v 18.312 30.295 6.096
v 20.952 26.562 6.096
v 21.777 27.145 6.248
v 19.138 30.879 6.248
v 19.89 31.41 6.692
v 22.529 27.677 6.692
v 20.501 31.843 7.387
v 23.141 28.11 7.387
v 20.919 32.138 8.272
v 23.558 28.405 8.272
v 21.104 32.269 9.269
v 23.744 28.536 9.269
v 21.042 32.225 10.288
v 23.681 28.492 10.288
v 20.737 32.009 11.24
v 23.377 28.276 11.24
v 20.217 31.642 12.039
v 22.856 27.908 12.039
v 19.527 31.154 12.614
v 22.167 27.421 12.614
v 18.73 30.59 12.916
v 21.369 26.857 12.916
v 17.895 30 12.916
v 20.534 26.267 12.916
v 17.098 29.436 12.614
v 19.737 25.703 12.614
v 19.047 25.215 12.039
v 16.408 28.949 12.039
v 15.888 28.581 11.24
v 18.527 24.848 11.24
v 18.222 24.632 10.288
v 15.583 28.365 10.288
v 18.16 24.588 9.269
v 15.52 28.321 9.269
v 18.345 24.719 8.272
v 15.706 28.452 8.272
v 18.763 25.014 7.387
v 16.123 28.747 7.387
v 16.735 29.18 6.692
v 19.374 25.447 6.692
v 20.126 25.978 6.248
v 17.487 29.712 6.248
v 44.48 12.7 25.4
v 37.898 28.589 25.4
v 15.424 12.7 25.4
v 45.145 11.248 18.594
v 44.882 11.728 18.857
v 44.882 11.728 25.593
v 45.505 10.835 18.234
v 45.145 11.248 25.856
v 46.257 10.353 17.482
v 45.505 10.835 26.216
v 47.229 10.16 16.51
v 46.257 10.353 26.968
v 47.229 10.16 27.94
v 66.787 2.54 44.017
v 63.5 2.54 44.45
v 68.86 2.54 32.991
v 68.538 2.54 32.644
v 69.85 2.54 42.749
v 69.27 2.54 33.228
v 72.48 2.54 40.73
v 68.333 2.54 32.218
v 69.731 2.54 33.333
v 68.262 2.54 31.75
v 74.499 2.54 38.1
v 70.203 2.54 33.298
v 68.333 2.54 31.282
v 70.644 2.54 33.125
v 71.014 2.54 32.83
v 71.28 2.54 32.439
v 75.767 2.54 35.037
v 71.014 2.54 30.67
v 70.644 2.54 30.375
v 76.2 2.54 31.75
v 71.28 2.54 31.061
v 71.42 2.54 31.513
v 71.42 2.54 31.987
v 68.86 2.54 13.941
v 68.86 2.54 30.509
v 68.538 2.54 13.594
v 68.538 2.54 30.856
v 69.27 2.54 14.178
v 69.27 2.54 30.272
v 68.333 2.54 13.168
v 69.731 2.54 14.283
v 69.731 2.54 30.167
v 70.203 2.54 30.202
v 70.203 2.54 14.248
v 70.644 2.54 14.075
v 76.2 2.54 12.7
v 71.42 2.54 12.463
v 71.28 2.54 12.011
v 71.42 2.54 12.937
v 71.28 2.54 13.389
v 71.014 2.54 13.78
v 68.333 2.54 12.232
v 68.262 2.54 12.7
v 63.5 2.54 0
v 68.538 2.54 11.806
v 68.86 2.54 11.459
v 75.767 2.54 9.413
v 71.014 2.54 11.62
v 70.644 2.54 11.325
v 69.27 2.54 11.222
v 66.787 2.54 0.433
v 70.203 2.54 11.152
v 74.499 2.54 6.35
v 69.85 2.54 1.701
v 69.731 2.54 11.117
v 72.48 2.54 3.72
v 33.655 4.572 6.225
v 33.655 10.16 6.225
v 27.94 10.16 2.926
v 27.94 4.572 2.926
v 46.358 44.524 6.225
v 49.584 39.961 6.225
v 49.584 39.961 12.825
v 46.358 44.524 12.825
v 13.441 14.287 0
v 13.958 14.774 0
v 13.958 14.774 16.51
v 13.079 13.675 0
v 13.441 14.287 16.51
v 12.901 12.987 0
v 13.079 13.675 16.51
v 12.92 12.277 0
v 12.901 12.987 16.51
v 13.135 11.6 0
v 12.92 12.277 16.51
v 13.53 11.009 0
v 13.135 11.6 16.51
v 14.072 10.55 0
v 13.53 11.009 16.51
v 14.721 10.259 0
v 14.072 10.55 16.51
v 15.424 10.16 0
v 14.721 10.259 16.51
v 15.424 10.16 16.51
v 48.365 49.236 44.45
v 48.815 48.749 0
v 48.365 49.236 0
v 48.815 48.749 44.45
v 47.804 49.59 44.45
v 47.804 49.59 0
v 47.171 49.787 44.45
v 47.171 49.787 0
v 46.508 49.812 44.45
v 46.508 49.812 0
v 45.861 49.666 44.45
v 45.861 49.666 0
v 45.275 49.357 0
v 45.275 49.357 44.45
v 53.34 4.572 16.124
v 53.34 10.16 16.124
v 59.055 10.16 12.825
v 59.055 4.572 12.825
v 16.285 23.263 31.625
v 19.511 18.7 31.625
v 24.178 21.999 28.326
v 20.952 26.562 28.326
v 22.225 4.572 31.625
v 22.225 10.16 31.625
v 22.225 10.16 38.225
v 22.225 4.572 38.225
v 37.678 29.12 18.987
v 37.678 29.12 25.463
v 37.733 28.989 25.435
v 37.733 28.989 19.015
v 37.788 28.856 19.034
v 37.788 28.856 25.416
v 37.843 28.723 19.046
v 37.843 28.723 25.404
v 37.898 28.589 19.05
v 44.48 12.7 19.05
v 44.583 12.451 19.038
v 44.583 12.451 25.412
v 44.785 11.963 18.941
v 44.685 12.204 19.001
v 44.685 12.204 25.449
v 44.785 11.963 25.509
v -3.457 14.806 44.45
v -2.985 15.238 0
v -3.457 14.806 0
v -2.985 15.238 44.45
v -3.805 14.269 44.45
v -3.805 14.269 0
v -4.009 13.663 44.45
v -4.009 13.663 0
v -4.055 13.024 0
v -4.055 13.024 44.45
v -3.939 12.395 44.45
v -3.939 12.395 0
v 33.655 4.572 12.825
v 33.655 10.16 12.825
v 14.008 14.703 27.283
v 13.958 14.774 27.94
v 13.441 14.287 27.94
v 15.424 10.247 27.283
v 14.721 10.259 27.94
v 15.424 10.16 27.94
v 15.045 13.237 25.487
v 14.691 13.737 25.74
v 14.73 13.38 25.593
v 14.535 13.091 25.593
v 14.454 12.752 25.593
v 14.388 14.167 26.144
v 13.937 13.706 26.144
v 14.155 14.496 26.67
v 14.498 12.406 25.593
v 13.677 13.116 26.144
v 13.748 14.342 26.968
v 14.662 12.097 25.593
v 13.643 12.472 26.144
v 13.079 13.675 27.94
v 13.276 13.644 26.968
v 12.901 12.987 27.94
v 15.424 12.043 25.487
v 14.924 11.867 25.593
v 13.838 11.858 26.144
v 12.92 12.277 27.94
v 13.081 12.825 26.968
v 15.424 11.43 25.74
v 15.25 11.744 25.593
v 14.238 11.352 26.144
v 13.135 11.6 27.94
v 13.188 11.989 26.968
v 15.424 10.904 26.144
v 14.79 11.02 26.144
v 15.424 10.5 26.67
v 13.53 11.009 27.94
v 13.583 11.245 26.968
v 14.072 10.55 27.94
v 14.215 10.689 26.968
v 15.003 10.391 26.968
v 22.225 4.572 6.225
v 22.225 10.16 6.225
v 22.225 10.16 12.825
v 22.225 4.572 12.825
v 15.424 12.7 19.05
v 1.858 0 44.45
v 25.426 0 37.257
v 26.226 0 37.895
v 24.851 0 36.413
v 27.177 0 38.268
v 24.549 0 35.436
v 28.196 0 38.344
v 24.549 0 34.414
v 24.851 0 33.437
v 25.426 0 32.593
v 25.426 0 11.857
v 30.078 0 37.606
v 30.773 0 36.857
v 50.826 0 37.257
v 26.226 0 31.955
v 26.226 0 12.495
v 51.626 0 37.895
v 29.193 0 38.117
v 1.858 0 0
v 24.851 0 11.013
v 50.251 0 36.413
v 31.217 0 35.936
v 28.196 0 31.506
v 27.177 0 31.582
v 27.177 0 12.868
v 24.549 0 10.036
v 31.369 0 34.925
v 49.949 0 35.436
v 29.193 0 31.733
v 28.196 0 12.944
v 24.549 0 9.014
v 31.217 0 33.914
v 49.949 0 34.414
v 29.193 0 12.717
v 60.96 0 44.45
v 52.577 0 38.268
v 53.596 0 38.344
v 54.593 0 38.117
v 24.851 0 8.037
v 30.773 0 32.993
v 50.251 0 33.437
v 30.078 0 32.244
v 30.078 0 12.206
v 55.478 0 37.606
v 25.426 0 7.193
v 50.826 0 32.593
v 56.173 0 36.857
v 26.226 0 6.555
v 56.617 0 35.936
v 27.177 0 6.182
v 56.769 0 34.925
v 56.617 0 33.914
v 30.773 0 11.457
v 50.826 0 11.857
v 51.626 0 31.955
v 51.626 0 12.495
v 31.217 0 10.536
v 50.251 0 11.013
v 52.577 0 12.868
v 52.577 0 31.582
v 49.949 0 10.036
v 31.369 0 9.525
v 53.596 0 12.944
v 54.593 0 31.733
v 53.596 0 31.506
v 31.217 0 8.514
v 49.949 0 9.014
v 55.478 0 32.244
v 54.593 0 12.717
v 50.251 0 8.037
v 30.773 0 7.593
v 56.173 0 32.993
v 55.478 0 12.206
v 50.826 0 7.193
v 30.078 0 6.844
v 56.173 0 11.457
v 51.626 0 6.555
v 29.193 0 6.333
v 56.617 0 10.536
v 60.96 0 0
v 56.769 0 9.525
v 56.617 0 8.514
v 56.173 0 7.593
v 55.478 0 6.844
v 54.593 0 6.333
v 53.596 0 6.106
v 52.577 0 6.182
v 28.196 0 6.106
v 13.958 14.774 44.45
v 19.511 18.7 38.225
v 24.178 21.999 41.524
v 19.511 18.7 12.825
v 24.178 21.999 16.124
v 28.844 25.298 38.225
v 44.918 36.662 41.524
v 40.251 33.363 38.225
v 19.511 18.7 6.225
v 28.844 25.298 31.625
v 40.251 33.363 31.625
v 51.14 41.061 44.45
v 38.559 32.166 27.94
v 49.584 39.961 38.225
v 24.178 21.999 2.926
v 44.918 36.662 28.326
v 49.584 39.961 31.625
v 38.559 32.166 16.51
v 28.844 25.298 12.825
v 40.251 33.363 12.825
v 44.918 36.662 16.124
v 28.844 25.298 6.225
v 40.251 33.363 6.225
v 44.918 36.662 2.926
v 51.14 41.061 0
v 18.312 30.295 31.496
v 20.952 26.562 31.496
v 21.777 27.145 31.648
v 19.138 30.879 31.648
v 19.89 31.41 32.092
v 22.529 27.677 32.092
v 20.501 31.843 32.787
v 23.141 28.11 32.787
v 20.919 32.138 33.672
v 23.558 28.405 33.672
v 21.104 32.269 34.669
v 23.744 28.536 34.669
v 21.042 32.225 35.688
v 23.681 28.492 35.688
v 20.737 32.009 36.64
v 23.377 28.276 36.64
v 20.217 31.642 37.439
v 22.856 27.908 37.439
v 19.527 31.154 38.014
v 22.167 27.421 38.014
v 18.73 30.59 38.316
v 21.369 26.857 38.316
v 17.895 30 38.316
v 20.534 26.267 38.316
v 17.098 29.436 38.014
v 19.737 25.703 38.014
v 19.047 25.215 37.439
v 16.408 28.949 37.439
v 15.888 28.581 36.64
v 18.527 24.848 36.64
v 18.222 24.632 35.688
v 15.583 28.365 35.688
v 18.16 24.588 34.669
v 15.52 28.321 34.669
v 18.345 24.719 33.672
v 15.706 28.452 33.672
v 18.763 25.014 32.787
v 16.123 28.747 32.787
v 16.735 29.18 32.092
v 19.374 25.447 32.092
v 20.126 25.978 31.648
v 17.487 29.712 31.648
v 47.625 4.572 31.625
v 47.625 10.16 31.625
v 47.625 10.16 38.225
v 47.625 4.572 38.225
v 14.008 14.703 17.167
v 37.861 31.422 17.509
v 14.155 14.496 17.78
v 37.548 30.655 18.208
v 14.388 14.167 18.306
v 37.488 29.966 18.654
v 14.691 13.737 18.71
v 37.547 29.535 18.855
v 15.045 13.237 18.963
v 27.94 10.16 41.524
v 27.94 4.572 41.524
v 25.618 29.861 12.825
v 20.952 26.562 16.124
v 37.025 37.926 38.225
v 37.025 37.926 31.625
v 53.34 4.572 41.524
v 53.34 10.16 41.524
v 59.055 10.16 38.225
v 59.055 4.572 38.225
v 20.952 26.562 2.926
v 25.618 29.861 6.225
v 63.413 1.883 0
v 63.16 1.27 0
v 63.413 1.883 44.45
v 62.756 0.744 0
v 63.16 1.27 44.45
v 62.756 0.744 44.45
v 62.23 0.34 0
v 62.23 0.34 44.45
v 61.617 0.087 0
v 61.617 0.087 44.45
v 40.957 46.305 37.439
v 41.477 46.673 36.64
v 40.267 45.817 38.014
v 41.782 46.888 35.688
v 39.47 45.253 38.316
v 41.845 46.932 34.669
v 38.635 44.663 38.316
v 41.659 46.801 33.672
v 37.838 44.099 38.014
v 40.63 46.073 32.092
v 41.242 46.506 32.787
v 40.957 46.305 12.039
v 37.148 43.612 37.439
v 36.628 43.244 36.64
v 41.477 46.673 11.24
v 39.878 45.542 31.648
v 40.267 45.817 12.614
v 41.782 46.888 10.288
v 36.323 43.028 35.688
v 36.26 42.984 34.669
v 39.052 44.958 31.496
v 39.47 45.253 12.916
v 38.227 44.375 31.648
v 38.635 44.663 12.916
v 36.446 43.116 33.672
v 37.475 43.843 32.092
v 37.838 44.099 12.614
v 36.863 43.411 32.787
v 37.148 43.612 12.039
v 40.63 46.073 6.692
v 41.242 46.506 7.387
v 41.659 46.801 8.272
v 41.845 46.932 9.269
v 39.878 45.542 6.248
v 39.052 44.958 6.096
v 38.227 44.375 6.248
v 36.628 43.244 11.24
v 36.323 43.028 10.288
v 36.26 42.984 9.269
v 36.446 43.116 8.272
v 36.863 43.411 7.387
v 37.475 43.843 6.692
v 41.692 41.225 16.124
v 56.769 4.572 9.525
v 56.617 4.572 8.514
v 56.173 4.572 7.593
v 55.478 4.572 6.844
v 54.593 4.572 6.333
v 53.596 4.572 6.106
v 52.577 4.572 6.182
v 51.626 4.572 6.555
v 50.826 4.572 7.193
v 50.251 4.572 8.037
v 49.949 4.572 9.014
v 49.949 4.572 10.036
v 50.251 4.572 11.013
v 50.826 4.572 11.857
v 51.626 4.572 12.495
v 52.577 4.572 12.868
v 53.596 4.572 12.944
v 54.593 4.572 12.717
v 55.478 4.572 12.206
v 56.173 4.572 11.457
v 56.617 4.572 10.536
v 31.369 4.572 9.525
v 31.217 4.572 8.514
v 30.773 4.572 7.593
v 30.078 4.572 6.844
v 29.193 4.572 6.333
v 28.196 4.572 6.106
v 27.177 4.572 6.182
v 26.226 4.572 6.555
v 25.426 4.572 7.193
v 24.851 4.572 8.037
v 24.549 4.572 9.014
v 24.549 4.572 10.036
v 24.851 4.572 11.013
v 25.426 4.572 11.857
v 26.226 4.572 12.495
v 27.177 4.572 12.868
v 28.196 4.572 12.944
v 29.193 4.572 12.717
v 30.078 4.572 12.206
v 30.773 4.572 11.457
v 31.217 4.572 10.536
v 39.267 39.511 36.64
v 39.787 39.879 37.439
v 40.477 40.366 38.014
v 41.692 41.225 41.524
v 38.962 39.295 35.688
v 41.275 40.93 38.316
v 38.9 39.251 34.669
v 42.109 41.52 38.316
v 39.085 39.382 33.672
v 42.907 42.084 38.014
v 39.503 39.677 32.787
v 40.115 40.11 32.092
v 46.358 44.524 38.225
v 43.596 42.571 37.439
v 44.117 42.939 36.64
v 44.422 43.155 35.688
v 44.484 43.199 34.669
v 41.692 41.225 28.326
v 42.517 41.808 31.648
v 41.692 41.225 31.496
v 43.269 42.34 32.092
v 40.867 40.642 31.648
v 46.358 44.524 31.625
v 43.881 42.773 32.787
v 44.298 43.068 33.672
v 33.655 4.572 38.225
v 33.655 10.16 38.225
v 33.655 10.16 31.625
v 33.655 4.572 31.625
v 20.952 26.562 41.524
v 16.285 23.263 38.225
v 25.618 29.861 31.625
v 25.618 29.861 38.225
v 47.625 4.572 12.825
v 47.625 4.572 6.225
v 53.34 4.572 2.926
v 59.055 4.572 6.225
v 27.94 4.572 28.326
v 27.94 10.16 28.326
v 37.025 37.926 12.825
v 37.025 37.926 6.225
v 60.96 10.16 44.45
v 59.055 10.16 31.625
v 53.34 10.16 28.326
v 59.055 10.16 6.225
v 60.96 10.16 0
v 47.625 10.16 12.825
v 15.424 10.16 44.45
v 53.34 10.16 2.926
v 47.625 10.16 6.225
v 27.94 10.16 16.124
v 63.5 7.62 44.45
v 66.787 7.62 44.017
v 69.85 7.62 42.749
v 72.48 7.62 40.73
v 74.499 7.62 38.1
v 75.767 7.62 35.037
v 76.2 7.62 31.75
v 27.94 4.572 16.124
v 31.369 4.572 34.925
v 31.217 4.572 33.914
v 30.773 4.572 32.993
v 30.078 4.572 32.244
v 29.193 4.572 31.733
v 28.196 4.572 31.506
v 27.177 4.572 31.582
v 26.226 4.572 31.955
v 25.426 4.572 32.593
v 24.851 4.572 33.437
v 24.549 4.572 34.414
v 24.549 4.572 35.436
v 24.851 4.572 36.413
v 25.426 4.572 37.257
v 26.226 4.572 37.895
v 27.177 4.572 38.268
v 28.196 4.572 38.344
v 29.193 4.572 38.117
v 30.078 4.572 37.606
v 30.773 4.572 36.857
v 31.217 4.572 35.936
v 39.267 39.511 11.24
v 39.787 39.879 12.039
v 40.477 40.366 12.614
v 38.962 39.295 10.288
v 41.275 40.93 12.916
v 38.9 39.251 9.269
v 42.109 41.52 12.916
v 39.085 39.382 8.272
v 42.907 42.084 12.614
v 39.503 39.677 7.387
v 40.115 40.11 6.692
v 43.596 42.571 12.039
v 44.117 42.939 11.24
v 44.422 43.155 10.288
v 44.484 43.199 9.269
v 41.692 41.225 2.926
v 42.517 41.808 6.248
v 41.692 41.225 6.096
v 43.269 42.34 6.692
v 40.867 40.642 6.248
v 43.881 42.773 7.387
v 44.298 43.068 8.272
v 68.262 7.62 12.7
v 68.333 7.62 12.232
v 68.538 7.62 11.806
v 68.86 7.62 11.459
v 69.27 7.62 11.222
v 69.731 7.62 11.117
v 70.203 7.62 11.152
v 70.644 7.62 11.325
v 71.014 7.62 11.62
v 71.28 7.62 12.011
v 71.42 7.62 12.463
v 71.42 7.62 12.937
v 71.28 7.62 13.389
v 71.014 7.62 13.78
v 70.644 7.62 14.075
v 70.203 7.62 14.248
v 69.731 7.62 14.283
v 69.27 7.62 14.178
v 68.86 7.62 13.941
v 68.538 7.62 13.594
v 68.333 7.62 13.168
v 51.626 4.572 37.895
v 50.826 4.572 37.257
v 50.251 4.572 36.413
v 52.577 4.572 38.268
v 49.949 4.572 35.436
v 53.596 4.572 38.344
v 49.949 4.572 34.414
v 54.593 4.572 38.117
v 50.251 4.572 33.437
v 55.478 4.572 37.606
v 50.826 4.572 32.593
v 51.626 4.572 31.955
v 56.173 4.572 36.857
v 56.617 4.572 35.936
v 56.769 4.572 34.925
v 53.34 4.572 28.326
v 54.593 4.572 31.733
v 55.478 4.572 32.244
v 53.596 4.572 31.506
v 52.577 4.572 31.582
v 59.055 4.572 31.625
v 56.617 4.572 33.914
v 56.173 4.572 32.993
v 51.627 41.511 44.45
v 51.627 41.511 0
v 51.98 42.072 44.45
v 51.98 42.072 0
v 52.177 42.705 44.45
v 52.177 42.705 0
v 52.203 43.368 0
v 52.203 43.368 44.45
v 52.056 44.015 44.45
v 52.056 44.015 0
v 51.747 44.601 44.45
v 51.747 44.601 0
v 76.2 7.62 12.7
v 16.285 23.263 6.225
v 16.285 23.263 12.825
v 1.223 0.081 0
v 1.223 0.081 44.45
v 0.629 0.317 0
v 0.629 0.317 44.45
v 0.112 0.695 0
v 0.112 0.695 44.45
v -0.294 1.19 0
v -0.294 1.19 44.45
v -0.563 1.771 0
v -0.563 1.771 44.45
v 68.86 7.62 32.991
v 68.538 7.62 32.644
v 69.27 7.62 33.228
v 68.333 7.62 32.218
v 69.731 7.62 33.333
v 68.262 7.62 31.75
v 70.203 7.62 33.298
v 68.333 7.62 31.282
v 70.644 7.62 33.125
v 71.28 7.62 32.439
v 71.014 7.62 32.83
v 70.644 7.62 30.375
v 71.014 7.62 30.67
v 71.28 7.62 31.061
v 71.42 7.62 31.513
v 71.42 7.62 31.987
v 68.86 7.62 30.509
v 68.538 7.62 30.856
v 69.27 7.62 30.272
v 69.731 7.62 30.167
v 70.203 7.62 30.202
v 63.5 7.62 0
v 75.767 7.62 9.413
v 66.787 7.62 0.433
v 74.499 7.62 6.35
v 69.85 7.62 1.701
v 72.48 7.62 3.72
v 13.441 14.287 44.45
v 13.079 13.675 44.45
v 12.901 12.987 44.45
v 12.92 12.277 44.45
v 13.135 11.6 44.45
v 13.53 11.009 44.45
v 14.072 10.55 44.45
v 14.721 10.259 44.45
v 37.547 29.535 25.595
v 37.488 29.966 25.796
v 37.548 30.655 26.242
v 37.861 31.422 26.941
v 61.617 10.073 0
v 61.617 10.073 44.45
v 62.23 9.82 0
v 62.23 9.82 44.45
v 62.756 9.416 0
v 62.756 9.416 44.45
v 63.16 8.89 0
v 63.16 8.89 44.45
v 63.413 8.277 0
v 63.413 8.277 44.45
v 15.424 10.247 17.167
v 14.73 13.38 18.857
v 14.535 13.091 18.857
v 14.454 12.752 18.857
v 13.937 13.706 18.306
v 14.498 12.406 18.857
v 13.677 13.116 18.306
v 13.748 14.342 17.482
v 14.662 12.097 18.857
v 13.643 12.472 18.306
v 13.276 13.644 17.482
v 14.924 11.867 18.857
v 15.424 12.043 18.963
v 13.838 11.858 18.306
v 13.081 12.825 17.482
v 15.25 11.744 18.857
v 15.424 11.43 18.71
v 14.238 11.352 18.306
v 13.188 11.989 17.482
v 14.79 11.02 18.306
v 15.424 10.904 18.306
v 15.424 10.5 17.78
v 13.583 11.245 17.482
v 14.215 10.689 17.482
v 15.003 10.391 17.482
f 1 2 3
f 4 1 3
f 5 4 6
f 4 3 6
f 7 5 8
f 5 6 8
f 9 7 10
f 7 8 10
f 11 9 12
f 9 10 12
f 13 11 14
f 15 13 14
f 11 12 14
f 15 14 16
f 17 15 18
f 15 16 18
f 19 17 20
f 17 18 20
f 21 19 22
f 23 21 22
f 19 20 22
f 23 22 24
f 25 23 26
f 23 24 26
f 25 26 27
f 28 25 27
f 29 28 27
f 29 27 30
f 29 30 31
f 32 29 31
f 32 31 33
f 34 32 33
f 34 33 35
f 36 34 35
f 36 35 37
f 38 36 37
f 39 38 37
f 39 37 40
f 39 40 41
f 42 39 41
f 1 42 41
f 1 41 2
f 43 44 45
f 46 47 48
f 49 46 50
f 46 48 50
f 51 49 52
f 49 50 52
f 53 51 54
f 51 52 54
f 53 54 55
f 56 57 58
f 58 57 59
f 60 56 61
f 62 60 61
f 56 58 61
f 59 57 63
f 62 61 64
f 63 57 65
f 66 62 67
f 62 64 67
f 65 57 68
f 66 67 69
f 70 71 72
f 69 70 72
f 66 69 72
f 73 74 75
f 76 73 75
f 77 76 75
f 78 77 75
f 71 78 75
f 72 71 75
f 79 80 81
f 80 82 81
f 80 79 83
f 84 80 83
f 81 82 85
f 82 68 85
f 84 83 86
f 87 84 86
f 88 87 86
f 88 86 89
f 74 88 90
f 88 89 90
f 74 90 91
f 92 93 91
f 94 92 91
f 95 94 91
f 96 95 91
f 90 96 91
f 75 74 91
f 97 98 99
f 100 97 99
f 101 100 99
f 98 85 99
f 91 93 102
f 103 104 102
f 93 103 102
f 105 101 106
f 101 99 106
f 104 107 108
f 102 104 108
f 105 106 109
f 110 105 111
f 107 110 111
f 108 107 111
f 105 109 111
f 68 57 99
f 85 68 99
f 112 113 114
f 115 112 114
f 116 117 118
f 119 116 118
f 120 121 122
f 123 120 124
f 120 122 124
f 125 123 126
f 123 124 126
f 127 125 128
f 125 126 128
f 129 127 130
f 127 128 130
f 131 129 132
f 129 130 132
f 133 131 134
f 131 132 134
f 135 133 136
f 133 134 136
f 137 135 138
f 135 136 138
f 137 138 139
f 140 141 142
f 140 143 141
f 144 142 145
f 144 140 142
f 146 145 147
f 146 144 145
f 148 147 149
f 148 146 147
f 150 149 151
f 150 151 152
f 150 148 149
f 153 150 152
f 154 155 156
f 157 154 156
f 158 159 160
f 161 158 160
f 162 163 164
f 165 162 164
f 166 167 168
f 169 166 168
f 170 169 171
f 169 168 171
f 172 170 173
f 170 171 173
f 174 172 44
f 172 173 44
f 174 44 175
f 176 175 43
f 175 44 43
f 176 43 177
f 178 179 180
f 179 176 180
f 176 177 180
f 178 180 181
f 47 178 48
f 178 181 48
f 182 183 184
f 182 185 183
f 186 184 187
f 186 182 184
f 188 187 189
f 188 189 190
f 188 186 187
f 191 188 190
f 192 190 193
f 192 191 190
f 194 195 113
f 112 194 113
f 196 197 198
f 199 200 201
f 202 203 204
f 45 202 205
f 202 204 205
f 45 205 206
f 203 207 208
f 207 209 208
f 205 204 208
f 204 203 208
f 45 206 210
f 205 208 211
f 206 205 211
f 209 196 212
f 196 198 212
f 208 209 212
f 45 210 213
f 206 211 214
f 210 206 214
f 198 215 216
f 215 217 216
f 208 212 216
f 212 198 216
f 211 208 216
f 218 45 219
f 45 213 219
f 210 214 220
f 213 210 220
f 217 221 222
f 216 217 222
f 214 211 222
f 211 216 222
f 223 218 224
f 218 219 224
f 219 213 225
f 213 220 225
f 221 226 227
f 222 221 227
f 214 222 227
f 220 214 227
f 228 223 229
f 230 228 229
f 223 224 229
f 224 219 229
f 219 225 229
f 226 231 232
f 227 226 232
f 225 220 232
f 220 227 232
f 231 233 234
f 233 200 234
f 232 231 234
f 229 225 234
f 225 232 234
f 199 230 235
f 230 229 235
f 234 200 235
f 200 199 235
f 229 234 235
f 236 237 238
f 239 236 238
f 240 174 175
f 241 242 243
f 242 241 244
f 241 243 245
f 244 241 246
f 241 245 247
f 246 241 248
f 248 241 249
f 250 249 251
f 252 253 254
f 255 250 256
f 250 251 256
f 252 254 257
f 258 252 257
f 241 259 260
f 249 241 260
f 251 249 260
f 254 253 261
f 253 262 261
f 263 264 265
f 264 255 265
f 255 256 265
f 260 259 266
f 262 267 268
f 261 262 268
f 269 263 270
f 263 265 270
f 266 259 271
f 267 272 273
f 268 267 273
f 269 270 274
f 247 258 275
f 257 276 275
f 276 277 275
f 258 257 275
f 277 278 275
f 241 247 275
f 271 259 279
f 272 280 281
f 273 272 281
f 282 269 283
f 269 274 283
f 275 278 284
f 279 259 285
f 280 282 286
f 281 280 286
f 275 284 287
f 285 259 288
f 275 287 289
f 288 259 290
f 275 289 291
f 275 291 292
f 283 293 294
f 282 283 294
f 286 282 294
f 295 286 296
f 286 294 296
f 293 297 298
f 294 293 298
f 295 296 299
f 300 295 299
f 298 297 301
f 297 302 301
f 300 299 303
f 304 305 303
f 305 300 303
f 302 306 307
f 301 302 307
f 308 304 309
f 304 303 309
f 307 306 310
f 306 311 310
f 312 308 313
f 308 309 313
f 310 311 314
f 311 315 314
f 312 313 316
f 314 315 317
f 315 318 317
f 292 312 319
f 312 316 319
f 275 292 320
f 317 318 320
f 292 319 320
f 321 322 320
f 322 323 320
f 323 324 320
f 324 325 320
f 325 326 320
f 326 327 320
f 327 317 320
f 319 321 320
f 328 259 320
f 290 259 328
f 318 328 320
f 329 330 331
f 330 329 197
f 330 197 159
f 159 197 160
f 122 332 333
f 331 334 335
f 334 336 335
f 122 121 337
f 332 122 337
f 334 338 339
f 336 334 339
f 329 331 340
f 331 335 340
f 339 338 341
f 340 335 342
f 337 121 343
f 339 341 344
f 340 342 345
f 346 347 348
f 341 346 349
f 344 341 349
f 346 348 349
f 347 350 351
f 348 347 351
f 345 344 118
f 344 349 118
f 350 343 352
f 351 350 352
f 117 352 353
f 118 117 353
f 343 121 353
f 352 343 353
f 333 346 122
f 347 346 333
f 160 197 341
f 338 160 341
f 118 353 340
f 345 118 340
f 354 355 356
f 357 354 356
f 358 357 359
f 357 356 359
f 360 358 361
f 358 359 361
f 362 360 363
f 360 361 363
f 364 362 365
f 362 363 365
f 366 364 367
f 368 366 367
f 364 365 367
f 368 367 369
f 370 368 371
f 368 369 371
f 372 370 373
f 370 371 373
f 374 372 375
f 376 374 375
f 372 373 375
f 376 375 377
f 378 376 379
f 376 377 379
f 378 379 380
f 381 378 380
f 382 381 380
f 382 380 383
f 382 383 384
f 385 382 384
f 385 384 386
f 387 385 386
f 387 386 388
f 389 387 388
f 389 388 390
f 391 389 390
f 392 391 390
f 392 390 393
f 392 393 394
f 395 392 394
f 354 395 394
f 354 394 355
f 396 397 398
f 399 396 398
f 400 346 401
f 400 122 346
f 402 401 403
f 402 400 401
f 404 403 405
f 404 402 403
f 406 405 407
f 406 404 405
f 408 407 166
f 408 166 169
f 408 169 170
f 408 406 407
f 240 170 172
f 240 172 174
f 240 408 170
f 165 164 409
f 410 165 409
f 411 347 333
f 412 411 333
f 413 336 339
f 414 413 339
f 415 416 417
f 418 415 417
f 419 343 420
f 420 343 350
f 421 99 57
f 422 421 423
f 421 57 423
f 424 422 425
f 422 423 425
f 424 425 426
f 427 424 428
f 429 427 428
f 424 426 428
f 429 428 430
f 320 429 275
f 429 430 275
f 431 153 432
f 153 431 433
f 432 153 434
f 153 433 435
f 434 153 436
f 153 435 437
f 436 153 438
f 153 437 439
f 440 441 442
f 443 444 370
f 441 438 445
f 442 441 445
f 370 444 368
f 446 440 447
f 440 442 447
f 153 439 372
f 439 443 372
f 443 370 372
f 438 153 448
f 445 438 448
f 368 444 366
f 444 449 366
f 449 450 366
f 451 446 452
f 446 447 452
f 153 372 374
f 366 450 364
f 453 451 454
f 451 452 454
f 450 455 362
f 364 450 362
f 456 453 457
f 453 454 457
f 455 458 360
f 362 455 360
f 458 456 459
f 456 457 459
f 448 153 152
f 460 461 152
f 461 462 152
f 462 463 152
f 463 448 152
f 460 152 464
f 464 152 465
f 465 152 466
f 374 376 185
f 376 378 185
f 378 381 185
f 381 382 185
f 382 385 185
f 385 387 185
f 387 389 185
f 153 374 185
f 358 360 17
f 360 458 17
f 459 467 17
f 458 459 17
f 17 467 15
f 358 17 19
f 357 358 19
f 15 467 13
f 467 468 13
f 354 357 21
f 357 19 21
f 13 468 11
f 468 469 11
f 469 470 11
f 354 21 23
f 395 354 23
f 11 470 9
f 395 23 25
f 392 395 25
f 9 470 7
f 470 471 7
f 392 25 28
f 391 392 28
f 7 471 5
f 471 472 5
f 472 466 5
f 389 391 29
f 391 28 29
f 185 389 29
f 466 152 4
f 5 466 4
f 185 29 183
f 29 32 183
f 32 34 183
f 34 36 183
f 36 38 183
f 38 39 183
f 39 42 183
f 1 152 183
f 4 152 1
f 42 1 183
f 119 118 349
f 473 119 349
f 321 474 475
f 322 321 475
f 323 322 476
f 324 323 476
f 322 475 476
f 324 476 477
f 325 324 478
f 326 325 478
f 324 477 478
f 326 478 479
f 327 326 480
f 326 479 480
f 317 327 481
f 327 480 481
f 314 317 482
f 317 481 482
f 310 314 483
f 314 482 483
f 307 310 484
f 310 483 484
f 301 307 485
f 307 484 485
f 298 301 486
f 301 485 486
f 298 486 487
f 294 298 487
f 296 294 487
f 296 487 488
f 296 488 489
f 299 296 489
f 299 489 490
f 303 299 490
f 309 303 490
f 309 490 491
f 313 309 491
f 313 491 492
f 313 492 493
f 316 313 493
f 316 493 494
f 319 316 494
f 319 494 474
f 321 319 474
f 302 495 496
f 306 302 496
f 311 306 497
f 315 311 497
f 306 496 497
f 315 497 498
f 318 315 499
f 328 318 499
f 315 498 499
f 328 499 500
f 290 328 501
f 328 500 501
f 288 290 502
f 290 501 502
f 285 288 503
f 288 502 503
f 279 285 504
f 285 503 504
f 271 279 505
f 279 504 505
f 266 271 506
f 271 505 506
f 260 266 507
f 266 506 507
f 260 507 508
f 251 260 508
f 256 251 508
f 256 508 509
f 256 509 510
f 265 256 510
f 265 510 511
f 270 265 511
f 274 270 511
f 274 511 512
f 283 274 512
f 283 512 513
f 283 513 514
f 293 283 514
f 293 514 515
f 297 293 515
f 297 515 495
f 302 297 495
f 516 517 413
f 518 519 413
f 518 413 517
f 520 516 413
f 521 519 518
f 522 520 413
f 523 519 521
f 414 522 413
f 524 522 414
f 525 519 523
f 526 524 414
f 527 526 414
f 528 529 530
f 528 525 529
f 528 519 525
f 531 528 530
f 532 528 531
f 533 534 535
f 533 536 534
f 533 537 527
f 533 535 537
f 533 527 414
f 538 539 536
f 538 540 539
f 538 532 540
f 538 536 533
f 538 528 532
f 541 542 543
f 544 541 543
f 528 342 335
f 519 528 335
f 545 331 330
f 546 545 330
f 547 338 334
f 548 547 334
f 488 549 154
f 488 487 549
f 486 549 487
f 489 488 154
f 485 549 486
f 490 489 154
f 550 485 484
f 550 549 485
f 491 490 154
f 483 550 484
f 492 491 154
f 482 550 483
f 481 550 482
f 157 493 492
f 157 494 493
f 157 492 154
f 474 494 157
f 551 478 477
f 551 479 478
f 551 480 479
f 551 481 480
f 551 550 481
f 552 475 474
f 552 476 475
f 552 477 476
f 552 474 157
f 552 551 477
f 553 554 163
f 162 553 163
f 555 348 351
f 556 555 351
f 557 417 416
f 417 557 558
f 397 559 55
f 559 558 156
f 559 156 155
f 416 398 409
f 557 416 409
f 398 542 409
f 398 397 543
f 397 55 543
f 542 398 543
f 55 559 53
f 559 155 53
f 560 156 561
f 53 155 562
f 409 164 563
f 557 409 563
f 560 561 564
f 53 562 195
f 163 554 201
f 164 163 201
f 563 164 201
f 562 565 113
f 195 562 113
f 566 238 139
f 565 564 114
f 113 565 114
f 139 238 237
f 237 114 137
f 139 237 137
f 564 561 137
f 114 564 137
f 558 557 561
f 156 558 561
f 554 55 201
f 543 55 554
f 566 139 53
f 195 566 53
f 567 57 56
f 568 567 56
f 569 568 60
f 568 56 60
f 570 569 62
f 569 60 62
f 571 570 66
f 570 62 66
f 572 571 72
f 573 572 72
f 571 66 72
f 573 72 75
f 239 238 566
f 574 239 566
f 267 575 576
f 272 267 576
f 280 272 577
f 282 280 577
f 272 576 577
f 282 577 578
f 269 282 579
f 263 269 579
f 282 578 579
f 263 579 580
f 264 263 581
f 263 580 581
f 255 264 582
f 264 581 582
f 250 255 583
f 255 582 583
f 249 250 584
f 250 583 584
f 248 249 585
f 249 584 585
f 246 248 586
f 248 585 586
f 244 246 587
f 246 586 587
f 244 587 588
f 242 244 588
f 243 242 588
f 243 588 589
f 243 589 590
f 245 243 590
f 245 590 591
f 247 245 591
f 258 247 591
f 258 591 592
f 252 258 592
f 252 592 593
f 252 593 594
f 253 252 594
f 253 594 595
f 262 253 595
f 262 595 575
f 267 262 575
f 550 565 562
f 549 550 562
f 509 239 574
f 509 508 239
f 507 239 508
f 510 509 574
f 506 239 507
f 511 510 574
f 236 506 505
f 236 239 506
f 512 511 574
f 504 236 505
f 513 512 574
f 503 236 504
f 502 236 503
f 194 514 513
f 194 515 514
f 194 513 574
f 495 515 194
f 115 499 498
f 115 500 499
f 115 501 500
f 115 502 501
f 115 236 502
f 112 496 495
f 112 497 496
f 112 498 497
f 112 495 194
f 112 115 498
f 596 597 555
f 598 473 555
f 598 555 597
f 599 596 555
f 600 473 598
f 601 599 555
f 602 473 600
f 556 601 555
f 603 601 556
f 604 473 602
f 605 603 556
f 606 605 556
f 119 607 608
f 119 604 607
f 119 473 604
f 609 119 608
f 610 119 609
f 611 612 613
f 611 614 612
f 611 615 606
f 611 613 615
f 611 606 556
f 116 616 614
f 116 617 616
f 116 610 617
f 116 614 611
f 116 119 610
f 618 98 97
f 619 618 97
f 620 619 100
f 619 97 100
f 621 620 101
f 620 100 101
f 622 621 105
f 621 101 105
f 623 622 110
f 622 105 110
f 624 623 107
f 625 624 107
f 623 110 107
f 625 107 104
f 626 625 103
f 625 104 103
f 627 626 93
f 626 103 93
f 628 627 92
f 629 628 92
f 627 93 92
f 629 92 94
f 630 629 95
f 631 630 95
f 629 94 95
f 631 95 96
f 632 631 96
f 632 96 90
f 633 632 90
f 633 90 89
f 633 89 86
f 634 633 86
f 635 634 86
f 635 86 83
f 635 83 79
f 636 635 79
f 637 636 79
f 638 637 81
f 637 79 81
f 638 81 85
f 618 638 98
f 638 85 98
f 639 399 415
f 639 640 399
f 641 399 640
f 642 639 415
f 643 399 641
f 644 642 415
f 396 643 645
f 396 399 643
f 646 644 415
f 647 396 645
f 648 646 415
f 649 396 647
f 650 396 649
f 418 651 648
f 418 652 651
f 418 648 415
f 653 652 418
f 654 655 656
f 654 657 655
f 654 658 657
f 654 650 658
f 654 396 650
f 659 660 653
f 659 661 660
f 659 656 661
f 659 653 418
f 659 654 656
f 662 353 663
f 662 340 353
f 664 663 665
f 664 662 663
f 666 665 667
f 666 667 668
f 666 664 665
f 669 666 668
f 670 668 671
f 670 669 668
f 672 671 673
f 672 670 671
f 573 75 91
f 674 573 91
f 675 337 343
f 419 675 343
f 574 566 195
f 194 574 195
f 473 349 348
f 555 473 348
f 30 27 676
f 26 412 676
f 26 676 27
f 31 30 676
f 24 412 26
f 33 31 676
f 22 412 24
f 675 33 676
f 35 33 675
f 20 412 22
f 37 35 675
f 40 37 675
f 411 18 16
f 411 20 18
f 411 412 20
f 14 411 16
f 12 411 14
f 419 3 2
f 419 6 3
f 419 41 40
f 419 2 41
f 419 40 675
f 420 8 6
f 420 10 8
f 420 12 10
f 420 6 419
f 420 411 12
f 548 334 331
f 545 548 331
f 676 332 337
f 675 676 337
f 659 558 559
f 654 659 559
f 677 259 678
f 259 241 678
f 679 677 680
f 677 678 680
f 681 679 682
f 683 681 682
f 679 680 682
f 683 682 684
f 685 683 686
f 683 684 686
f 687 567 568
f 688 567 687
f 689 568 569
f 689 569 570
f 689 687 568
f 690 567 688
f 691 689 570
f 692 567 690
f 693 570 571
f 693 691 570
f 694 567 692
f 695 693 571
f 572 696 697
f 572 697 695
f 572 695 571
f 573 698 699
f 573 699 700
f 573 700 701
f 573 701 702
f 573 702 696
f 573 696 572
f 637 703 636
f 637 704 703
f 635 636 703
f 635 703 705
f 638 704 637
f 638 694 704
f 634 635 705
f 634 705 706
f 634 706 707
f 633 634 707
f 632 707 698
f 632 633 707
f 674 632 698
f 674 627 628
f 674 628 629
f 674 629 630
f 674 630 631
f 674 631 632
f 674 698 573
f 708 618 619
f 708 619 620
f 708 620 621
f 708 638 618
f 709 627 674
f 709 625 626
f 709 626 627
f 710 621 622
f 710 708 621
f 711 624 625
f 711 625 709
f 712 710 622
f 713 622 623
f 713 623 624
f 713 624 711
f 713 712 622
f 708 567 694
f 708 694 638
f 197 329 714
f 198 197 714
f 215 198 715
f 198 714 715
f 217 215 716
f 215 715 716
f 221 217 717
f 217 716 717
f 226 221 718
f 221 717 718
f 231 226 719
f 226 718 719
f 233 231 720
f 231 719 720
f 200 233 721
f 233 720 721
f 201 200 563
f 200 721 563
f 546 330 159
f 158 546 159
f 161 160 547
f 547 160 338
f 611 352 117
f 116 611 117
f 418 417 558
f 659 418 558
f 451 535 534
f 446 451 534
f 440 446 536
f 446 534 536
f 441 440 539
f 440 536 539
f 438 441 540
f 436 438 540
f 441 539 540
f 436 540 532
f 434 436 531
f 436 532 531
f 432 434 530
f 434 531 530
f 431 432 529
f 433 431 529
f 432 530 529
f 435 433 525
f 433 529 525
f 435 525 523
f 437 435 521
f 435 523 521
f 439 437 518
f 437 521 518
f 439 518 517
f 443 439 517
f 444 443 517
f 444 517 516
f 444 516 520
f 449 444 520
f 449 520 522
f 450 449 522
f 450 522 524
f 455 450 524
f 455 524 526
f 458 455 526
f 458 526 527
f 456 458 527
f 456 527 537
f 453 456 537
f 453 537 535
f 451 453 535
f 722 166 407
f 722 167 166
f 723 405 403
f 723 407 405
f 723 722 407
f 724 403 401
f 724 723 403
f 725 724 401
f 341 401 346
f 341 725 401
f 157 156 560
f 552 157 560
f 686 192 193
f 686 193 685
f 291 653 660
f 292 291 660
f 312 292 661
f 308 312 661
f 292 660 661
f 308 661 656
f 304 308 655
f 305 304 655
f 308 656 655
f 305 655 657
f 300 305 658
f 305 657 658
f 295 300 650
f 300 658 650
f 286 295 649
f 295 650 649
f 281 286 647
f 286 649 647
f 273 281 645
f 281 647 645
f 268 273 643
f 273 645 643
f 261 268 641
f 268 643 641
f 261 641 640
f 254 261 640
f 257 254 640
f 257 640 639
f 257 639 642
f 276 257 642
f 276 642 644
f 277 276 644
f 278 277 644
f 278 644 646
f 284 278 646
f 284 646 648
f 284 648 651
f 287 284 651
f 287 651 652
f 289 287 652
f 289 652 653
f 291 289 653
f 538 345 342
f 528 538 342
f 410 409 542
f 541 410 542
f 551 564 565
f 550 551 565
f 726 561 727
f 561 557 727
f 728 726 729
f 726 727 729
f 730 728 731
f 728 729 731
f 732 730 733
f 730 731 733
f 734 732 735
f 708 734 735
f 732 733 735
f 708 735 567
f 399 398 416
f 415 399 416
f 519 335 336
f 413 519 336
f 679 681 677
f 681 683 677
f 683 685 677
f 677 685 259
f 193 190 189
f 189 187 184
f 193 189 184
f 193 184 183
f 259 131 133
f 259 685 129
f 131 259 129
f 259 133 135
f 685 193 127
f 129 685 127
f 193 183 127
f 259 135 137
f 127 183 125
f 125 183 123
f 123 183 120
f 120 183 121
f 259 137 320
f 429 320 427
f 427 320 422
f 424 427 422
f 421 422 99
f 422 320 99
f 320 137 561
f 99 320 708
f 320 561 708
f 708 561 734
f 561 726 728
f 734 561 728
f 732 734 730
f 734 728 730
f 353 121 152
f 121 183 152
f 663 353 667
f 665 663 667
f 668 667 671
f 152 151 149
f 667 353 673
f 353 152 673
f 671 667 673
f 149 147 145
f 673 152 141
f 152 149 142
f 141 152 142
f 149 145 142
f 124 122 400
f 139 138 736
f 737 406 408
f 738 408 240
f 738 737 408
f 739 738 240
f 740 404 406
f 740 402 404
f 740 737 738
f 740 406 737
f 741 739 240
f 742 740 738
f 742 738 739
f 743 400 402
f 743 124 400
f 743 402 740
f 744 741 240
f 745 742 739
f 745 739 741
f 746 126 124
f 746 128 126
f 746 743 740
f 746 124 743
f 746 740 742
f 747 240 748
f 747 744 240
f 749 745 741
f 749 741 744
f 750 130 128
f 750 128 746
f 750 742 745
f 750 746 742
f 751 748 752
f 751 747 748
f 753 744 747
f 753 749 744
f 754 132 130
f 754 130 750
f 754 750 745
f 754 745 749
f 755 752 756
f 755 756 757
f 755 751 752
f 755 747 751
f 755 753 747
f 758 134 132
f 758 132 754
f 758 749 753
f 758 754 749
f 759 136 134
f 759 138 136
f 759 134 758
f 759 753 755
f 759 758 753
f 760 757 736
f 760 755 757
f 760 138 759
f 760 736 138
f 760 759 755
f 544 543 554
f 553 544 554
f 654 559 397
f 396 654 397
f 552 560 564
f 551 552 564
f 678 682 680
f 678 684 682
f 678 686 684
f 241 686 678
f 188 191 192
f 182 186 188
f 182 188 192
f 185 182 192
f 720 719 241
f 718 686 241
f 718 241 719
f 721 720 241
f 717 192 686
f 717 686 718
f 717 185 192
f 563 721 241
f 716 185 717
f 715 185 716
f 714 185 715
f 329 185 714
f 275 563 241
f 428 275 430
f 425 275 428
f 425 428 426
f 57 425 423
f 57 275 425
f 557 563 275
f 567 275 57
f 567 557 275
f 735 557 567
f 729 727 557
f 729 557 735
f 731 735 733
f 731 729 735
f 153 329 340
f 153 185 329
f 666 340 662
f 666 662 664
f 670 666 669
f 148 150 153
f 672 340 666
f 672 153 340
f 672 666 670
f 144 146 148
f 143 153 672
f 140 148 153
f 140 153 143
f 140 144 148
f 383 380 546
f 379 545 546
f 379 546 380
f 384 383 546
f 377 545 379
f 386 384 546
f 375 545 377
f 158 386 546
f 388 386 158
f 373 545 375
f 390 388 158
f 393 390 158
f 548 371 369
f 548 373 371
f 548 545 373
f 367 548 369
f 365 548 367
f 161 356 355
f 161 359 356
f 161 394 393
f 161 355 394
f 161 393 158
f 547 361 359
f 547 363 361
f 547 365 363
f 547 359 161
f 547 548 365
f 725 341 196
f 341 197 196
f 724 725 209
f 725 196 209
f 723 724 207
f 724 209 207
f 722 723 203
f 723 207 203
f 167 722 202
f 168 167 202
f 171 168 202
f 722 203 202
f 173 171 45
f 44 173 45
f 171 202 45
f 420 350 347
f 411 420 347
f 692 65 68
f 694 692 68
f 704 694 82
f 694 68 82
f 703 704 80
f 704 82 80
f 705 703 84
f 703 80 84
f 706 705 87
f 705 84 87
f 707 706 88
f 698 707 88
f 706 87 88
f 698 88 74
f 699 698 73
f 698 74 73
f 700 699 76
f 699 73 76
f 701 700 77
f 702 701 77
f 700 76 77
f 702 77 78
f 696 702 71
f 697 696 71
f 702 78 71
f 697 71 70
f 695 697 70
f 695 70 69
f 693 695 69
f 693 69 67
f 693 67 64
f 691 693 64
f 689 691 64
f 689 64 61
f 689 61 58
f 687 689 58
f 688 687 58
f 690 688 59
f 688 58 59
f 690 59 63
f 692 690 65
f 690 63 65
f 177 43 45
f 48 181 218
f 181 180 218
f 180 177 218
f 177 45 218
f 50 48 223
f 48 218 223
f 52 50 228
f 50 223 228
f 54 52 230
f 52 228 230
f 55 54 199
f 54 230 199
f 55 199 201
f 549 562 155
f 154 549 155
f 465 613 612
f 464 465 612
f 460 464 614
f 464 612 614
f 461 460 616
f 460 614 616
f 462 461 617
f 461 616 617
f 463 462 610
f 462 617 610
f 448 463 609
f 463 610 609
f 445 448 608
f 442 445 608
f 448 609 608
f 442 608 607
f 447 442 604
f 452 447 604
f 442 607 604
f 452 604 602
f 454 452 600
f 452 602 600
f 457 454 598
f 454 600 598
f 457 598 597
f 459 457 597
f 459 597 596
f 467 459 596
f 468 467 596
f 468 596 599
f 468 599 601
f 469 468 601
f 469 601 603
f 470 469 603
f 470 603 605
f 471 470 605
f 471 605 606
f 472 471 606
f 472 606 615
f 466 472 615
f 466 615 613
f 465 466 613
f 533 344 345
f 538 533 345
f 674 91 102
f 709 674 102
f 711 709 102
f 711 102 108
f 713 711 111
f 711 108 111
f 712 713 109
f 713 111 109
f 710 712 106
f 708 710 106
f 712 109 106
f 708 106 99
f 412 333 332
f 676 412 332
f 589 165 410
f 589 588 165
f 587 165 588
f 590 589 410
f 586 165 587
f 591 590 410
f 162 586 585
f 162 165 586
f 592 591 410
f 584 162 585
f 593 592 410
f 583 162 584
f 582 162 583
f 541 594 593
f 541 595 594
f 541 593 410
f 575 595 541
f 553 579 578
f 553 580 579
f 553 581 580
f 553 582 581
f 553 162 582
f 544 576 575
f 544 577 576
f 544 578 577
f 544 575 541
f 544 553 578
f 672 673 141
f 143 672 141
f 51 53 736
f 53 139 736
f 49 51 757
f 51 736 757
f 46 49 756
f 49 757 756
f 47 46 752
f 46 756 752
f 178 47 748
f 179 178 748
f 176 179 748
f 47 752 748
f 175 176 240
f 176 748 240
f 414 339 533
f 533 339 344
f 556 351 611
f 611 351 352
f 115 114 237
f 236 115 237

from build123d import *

# Parameters (mm, degrees)
BOSS_EXTRUDE1_DEPTH = 44.45
SKETCH2_R           = 3.429
CUT_EXTRUDE1_DEPTH  = 44.45
SKETCH3_R           = 3.429
CUT_EXTRUDE2_DEPTH  = 44.45
CUT_EXTRUDE3_DEPTH  = 5.588
CUT_EXTRUDE4_DEPTH  = 5.588
BOSS_EXTRUDE2_DEPTH = 3.175
FILLET1_R           = 2.54
SKETCH7_R           = 1.5875
BOSS_EXTRUDE3_DEPTH = 5.08


with BuildPart() as part:
    # Sketch1 → Boss-Extrude1 (new body)
    with BuildSketch(Plane.XY):
        Polygon((0, 0), (63.5, 0), (63.5, 10.16), (7.431912016, 10.16), (53.213794099, 42.527418233), (47.348550945, 50.823472882), (-4.50179061, 14.165703165), align=None)
    extrude(amount=BOSS_EXTRUDE1_DEPTH)

    # Sketch2 → Cut-Extrude1 (cut)
    with BuildSketch(Plane(origin=(0, 10.16, 0), x_dir=(1, 0, 0), z_dir=(0, 1, 0))):
        with Locations((53.34, -34.925)):
            Circle(SKETCH2_R)
        with Locations((53.34, -9.525)):
            Circle(SKETCH2_R)
        with Locations((27.94, -9.525)):
            Circle(SKETCH2_R)
        with Locations((27.94, -34.925)):
            Circle(SKETCH2_R)
    extrude(amount=-CUT_EXTRUDE1_DEPTH, mode=Mode.SUBTRACT)

    # Sketch3 → Cut-Extrude2 (cut)
    with BuildSketch(Plane(origin=(-2.312443215, 3.270820114, 0), x_dir=(0, 0, -1), z_dir=(0.577287712, -0.816540812, 0))):
        with Locations((-9.525, 32.44179061)):
            Circle(SKETCH3_R)
        with Locations((-9.525, 57.84179061)):
            Circle(SKETCH3_R)
        with Locations((-34.925, 57.84179061)):
            Circle(SKETCH3_R)
        with Locations((-34.925, 32.44179061)):
            Circle(SKETCH3_R)
    extrude(amount=-CUT_EXTRUDE2_DEPTH, mode=Mode.SUBTRACT)

    # Sketch4 → Cut-Extrude3 (cut)
    with BuildSketch(Plane(origin=(0, 10.16, 0), x_dir=(1, 0, 0), z_dir=(0, 1, 0))):
        Polygon((22.225, -31.625443212), (22.225, -38.224556788), (27.94, -41.524113577), (33.655, -38.224556788), (33.655, -31.625443212), (27.94, -28.325886423), align=None)
        Polygon((47.625, -31.625443212), (47.625, -38.224556788), (53.34, -41.524113577), (59.055, -38.224556788), (59.055, -31.625443212), (53.34, -28.325886423), align=None)
        Polygon((22.225, -6.225443212), (22.225, -12.824556788), (27.94, -16.124113577), (33.655, -12.824556788), (33.655, -6.225443212), (27.94, -2.925886423), align=None)
        Polygon((47.625, -6.225443212), (47.625, -12.824556788), (53.34, -16.124113577), (59.055, -12.824556788), (59.055, -6.225443212), (53.34, -2.925886423), align=None)
    extrude(amount=-CUT_EXTRUDE3_DEPTH, mode=Mode.SUBTRACT)

    # Sketch5 → Cut-Extrude4 (cut)
    with BuildSketch(Plane(origin=(-2.312443215, 3.270820114, 0), x_dir=(0, 0, -1), z_dir=(0.577287712, -0.816540812, 0))):
        Polygon((-2.925886423, 57.84179061), (-6.225443212, 63.55679061), (-12.824556788, 63.55679061), (-16.124113577, 57.84179061), (-12.824556788, 52.12679061), (-6.225443212, 52.12679061), align=None)
        Polygon((-28.325886423, 57.84179061), (-31.625443212, 63.55679061), (-38.224556788, 63.55679061), (-41.524113577, 57.84179061), (-38.224556788, 52.12679061), (-31.625443212, 52.12679061), align=None)
        Polygon((-2.925886423, 32.44179061), (-6.225443212, 38.15679061), (-12.824556788, 38.15679061), (-16.124113577, 32.44179061), (-12.824556788, 26.72679061), (-6.225443212, 26.72679061), align=None)
        Polygon((-28.325886423, 32.44179061), (-31.625443212, 38.15679061), (-38.224556788, 38.15679061), (-41.524113577, 32.44179061), (-38.224556788, 26.72679061), (-31.625443212, 26.72679061), align=None)
    extrude(amount=-CUT_EXTRUDE4_DEPTH, mode=Mode.SUBTRACT)

    # Sketch6 → Boss-Extrude2 (add, symmetric)
    with BuildSketch(Plane.XY.offset(22.225)):
        Polygon((7.431912016, 10.16), (34.372680379, 37.100768363), (45.531912016, 10.16), align=None)
    extrude(amount=BOSS_EXTRUDE2_DEPTH, both=True)

    # Fillet1
    fillet1_edges = [part.edges().sort_by_distance(p)[0] for p in [
        (-4.50179061, 14.165703165, 22.225),
        (47.348550945, 50.823472882, 22.225),
        (53.213794099, 42.527418233, 22.225),
        (7.431912016, 10.16, 34.925),
        (63.5, 10.16, 22.225),
        (63.5, 0, 22.225),
        (0, 0, 22.225),
        (7.431912016, 10.16, 9.525),
        (22.166849982, 20.577481285, 19.05),
        (36.901787948, 30.99496257, 22.225),
        (22.166849982, 20.577481285, 25.4),
        (45.531912016, 10.16, 22.225),
        (26.481912016, 10.16, 25.4),
        (26.481912016, 10.16, 19.05),
    ]]
    fillet(fillet1_edges, radius=FILLET1_R)

    # Sketch7 → Boss-Extrude3 (add)
    with BuildSketch(Plane(origin=(0, 2.54, 0), x_dir=(-1, 0, 0), z_dir=(0, -1, 0))):
        with BuildLine():
            Line((-63.5, 0), (-63.5, -44.45))
            ThreePointArc((-63.5, -44.45), (-72.480256121, -40.730256121), (-76.2, -31.75))
            Line((-76.2, -31.75), (-76.2, -12.7))
            ThreePointArc((-76.2, -12.7), (-72.480256121, -3.719743879), (-63.5, 0))
        make_face()
        with Locations((-69.85, -12.7)):
            Circle(SKETCH7_R, mode=Mode.SUBTRACT)
        with Locations((-69.85, -31.75)):
            Circle(SKETCH7_R, mode=Mode.SUBTRACT)
    extrude(amount=-BOSS_EXTRUDE3_DEPTH)


solid = part.part
